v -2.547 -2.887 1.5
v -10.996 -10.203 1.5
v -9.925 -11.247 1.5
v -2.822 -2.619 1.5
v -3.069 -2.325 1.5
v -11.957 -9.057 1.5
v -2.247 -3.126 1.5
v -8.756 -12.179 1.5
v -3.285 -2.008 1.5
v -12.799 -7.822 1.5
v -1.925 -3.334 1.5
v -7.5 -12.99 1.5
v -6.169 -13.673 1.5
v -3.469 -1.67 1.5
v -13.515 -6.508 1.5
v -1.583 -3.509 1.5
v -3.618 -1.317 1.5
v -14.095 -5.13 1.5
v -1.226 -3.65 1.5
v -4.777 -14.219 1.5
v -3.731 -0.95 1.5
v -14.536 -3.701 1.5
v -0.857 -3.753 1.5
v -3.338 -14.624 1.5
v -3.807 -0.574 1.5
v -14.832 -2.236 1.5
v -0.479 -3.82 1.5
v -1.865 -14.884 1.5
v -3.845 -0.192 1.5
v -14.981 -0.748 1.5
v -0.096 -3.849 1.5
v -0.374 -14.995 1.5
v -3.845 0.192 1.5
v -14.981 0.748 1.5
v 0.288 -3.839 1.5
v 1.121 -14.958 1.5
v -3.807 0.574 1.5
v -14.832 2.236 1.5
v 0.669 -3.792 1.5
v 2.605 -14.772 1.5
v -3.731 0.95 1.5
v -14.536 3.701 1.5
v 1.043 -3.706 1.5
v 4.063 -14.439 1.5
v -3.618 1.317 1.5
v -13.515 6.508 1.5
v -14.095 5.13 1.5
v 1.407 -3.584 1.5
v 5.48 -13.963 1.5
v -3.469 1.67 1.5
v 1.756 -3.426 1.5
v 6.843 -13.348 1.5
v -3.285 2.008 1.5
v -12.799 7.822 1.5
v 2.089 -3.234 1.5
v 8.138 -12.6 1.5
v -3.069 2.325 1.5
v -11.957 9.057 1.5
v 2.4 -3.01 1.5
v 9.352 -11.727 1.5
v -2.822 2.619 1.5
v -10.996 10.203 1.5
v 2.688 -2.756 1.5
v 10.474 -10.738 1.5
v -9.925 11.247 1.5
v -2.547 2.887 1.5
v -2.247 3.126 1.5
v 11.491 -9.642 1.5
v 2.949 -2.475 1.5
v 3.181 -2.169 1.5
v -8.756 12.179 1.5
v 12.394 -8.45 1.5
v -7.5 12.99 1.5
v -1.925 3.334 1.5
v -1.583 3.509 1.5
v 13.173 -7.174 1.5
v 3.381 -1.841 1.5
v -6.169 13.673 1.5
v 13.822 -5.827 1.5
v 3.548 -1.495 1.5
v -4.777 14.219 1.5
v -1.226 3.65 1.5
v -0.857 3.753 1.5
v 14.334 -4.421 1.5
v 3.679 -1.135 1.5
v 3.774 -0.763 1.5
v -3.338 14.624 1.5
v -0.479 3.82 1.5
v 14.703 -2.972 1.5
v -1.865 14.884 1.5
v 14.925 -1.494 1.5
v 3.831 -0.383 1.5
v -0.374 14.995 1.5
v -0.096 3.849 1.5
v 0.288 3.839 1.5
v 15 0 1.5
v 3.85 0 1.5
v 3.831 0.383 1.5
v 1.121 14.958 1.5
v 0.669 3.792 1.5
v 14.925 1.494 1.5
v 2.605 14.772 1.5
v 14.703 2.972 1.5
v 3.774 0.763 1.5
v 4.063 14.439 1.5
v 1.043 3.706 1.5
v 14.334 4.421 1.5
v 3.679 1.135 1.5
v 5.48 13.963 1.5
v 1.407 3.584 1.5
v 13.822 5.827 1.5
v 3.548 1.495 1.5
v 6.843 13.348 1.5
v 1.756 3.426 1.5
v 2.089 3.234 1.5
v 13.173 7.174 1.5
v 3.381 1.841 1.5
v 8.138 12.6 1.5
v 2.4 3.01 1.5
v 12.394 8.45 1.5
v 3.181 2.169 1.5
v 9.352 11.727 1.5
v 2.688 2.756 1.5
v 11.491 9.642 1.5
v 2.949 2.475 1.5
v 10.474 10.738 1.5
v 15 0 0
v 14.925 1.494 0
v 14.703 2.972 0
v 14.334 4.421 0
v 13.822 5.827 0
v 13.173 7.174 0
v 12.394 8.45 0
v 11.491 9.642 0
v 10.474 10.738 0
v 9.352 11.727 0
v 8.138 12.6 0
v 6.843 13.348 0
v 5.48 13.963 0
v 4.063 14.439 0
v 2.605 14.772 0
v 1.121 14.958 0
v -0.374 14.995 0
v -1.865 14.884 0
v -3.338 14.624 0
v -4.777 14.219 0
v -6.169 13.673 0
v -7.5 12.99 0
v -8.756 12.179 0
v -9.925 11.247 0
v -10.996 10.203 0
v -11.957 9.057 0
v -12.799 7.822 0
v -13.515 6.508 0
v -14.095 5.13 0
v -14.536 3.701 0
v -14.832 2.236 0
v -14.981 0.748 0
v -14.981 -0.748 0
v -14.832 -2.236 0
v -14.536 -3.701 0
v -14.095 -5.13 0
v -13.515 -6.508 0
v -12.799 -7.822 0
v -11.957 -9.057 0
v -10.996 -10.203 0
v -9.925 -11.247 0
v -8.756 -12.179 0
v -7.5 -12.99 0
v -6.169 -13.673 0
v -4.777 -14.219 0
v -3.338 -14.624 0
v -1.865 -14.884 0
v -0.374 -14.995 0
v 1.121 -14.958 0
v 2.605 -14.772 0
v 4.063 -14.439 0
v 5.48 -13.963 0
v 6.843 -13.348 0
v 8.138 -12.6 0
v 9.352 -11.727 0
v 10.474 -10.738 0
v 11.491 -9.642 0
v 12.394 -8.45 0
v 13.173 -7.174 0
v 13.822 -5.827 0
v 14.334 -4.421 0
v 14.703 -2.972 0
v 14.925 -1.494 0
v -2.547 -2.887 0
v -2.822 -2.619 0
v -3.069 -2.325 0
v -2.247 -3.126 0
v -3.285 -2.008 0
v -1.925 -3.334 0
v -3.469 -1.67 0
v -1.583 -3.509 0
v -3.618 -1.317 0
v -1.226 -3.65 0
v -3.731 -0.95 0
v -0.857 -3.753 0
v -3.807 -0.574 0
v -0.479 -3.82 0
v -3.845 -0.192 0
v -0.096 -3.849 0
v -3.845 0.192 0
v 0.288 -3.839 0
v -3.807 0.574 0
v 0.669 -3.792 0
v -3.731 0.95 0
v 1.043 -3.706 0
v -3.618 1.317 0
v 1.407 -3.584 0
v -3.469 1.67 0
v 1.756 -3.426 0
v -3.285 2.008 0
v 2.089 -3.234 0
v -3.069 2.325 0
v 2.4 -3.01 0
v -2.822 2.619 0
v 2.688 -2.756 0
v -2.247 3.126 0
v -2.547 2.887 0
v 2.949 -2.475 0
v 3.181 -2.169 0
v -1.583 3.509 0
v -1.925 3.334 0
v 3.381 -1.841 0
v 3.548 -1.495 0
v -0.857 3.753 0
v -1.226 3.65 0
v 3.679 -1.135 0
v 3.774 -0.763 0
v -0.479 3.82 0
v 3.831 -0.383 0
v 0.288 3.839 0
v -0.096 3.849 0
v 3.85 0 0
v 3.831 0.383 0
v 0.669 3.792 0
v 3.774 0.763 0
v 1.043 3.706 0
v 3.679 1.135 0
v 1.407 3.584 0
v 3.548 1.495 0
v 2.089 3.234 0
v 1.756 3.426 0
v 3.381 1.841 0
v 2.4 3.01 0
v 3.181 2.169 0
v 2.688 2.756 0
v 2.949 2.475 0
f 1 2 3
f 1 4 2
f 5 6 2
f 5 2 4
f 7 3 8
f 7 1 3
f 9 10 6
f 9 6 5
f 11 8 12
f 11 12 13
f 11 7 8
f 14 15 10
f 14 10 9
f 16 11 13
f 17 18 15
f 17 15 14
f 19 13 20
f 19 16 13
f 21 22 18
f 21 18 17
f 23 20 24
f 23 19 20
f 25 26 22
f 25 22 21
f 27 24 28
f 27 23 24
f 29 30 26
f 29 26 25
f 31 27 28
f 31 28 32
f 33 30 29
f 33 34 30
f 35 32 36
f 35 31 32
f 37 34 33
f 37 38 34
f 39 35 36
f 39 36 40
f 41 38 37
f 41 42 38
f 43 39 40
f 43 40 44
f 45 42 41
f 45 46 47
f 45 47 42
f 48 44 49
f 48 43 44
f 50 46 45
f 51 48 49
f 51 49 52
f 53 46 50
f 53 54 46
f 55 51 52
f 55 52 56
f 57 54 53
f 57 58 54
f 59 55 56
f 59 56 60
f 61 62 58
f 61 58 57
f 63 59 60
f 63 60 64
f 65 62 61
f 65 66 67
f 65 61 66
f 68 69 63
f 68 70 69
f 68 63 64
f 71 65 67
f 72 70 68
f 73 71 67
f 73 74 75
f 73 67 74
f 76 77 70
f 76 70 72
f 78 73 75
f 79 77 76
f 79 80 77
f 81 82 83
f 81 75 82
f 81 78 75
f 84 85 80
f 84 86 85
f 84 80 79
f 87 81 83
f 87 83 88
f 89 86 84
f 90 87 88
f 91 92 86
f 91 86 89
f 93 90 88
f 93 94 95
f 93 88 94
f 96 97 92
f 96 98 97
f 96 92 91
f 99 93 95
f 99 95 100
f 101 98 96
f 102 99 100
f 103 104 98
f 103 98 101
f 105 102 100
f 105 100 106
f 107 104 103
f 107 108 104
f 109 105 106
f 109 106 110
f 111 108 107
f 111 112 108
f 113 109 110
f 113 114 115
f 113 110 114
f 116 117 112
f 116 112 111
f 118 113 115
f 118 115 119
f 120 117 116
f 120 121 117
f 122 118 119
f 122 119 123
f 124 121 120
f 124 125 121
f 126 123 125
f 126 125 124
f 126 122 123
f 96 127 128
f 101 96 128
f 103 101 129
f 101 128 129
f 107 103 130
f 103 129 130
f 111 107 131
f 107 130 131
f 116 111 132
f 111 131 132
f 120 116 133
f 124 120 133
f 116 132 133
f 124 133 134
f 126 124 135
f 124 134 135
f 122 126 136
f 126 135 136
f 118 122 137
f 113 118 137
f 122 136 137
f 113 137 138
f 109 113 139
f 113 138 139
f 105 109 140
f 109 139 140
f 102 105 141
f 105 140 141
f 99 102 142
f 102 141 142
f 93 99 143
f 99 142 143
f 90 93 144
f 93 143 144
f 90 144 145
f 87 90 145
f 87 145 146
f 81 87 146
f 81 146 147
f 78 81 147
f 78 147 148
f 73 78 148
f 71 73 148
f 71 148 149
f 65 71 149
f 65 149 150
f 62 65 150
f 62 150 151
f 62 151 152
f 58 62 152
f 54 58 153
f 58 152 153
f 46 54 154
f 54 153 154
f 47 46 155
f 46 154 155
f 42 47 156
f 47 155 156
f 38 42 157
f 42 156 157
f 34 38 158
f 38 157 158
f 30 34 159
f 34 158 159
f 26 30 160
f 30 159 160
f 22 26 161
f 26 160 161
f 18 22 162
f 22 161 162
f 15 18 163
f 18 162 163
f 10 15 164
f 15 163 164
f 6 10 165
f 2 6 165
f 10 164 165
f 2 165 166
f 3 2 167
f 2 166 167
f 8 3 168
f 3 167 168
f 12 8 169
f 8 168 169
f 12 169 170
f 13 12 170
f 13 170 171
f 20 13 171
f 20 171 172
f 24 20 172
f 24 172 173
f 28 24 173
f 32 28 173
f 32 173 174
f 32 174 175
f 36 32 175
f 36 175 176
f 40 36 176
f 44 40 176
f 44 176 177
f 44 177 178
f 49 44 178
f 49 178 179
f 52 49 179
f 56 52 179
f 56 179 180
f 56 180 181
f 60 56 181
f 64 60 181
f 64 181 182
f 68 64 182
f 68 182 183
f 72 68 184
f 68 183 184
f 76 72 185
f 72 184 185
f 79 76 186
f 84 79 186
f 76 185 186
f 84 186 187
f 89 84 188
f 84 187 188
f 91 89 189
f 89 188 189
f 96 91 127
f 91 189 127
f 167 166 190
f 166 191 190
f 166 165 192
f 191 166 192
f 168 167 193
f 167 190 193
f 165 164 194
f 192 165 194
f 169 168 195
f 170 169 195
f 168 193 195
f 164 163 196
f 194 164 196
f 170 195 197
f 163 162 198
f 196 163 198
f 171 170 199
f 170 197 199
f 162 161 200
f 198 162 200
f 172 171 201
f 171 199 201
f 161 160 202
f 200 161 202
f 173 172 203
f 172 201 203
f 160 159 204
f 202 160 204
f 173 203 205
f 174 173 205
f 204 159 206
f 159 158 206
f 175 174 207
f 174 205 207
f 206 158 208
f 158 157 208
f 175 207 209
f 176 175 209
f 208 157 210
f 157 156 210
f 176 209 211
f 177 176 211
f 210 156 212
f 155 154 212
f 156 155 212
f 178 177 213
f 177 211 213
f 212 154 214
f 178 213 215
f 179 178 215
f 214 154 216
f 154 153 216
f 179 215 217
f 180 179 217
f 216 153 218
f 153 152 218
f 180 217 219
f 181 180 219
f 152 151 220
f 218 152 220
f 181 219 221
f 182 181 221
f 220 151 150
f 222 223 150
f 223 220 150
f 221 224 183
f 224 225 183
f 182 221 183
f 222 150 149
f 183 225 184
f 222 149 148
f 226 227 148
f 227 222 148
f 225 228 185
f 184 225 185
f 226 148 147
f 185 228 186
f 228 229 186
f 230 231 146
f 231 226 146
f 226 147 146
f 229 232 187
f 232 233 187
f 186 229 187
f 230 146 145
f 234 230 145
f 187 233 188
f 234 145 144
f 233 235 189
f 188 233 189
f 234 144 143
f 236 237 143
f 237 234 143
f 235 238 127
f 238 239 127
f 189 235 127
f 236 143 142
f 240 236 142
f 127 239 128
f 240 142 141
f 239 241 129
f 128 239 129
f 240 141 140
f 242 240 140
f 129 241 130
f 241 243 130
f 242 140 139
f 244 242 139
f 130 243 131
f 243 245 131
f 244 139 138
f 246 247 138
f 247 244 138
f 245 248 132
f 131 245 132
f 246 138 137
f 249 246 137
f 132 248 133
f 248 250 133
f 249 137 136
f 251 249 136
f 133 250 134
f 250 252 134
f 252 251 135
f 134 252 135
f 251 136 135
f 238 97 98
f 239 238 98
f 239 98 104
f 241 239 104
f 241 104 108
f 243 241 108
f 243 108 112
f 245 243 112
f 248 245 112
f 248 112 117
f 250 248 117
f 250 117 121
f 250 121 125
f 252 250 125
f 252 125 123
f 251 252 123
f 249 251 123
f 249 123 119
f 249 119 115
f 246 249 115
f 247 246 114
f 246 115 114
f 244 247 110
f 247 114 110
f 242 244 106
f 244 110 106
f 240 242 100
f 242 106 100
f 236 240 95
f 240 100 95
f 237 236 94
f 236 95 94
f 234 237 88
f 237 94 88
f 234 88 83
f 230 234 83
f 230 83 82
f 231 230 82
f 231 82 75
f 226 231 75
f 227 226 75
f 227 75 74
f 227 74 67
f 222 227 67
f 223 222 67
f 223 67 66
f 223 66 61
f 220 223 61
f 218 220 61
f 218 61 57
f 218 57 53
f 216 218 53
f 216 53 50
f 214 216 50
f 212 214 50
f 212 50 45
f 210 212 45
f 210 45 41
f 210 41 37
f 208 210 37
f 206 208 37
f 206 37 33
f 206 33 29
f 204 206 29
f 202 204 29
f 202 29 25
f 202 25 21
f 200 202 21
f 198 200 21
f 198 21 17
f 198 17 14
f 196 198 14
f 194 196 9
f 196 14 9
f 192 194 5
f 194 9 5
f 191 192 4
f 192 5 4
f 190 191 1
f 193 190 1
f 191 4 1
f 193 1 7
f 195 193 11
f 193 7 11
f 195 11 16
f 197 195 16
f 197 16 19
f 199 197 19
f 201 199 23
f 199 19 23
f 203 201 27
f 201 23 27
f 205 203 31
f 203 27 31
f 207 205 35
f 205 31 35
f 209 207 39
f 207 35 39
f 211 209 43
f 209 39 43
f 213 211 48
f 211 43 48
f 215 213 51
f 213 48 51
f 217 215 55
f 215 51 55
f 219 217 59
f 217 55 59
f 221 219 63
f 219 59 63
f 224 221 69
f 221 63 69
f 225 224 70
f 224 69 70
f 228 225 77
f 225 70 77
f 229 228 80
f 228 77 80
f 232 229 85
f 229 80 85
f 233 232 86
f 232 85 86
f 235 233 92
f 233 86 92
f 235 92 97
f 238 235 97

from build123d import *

# Parameters (mm, degrees)
F0_R     = 15
F0_R_2   = 2
F1_DEPTH = 1.5
F2_R     = 3.85
F2_R_2   = 2
F3_DEPTH = 11.5
F4_DEPTH = 25


with BuildPart() as f1:
    # F0 (on Top) → F1 (new body)
    with BuildSketch(Plane.XY):
        Circle(F0_R)
        Circle(F0_R_2, mode=Mode.SUBTRACT)
    extrude(amount=F1_DEPTH)

    # F2 (on face) → F3 (join)
    with BuildSketch(Plane.XY.offset(1.5)):
        Circle(F2_R)
        Circle(F2_R_2, mode=Mode.SUBTRACT)
    extrude(amount=F3_DEPTH)

    # F4 (cut): a face of the model
    f4_faces = [f1.faces().sort_by_distance(p)[0] for p in [
        (-3.7411055557, 0, 13),
    ]]
    extrude(f4_faces, amount=-F4_DEPTH, mode=Mode.SUBTRACT)


solid = f1.part
